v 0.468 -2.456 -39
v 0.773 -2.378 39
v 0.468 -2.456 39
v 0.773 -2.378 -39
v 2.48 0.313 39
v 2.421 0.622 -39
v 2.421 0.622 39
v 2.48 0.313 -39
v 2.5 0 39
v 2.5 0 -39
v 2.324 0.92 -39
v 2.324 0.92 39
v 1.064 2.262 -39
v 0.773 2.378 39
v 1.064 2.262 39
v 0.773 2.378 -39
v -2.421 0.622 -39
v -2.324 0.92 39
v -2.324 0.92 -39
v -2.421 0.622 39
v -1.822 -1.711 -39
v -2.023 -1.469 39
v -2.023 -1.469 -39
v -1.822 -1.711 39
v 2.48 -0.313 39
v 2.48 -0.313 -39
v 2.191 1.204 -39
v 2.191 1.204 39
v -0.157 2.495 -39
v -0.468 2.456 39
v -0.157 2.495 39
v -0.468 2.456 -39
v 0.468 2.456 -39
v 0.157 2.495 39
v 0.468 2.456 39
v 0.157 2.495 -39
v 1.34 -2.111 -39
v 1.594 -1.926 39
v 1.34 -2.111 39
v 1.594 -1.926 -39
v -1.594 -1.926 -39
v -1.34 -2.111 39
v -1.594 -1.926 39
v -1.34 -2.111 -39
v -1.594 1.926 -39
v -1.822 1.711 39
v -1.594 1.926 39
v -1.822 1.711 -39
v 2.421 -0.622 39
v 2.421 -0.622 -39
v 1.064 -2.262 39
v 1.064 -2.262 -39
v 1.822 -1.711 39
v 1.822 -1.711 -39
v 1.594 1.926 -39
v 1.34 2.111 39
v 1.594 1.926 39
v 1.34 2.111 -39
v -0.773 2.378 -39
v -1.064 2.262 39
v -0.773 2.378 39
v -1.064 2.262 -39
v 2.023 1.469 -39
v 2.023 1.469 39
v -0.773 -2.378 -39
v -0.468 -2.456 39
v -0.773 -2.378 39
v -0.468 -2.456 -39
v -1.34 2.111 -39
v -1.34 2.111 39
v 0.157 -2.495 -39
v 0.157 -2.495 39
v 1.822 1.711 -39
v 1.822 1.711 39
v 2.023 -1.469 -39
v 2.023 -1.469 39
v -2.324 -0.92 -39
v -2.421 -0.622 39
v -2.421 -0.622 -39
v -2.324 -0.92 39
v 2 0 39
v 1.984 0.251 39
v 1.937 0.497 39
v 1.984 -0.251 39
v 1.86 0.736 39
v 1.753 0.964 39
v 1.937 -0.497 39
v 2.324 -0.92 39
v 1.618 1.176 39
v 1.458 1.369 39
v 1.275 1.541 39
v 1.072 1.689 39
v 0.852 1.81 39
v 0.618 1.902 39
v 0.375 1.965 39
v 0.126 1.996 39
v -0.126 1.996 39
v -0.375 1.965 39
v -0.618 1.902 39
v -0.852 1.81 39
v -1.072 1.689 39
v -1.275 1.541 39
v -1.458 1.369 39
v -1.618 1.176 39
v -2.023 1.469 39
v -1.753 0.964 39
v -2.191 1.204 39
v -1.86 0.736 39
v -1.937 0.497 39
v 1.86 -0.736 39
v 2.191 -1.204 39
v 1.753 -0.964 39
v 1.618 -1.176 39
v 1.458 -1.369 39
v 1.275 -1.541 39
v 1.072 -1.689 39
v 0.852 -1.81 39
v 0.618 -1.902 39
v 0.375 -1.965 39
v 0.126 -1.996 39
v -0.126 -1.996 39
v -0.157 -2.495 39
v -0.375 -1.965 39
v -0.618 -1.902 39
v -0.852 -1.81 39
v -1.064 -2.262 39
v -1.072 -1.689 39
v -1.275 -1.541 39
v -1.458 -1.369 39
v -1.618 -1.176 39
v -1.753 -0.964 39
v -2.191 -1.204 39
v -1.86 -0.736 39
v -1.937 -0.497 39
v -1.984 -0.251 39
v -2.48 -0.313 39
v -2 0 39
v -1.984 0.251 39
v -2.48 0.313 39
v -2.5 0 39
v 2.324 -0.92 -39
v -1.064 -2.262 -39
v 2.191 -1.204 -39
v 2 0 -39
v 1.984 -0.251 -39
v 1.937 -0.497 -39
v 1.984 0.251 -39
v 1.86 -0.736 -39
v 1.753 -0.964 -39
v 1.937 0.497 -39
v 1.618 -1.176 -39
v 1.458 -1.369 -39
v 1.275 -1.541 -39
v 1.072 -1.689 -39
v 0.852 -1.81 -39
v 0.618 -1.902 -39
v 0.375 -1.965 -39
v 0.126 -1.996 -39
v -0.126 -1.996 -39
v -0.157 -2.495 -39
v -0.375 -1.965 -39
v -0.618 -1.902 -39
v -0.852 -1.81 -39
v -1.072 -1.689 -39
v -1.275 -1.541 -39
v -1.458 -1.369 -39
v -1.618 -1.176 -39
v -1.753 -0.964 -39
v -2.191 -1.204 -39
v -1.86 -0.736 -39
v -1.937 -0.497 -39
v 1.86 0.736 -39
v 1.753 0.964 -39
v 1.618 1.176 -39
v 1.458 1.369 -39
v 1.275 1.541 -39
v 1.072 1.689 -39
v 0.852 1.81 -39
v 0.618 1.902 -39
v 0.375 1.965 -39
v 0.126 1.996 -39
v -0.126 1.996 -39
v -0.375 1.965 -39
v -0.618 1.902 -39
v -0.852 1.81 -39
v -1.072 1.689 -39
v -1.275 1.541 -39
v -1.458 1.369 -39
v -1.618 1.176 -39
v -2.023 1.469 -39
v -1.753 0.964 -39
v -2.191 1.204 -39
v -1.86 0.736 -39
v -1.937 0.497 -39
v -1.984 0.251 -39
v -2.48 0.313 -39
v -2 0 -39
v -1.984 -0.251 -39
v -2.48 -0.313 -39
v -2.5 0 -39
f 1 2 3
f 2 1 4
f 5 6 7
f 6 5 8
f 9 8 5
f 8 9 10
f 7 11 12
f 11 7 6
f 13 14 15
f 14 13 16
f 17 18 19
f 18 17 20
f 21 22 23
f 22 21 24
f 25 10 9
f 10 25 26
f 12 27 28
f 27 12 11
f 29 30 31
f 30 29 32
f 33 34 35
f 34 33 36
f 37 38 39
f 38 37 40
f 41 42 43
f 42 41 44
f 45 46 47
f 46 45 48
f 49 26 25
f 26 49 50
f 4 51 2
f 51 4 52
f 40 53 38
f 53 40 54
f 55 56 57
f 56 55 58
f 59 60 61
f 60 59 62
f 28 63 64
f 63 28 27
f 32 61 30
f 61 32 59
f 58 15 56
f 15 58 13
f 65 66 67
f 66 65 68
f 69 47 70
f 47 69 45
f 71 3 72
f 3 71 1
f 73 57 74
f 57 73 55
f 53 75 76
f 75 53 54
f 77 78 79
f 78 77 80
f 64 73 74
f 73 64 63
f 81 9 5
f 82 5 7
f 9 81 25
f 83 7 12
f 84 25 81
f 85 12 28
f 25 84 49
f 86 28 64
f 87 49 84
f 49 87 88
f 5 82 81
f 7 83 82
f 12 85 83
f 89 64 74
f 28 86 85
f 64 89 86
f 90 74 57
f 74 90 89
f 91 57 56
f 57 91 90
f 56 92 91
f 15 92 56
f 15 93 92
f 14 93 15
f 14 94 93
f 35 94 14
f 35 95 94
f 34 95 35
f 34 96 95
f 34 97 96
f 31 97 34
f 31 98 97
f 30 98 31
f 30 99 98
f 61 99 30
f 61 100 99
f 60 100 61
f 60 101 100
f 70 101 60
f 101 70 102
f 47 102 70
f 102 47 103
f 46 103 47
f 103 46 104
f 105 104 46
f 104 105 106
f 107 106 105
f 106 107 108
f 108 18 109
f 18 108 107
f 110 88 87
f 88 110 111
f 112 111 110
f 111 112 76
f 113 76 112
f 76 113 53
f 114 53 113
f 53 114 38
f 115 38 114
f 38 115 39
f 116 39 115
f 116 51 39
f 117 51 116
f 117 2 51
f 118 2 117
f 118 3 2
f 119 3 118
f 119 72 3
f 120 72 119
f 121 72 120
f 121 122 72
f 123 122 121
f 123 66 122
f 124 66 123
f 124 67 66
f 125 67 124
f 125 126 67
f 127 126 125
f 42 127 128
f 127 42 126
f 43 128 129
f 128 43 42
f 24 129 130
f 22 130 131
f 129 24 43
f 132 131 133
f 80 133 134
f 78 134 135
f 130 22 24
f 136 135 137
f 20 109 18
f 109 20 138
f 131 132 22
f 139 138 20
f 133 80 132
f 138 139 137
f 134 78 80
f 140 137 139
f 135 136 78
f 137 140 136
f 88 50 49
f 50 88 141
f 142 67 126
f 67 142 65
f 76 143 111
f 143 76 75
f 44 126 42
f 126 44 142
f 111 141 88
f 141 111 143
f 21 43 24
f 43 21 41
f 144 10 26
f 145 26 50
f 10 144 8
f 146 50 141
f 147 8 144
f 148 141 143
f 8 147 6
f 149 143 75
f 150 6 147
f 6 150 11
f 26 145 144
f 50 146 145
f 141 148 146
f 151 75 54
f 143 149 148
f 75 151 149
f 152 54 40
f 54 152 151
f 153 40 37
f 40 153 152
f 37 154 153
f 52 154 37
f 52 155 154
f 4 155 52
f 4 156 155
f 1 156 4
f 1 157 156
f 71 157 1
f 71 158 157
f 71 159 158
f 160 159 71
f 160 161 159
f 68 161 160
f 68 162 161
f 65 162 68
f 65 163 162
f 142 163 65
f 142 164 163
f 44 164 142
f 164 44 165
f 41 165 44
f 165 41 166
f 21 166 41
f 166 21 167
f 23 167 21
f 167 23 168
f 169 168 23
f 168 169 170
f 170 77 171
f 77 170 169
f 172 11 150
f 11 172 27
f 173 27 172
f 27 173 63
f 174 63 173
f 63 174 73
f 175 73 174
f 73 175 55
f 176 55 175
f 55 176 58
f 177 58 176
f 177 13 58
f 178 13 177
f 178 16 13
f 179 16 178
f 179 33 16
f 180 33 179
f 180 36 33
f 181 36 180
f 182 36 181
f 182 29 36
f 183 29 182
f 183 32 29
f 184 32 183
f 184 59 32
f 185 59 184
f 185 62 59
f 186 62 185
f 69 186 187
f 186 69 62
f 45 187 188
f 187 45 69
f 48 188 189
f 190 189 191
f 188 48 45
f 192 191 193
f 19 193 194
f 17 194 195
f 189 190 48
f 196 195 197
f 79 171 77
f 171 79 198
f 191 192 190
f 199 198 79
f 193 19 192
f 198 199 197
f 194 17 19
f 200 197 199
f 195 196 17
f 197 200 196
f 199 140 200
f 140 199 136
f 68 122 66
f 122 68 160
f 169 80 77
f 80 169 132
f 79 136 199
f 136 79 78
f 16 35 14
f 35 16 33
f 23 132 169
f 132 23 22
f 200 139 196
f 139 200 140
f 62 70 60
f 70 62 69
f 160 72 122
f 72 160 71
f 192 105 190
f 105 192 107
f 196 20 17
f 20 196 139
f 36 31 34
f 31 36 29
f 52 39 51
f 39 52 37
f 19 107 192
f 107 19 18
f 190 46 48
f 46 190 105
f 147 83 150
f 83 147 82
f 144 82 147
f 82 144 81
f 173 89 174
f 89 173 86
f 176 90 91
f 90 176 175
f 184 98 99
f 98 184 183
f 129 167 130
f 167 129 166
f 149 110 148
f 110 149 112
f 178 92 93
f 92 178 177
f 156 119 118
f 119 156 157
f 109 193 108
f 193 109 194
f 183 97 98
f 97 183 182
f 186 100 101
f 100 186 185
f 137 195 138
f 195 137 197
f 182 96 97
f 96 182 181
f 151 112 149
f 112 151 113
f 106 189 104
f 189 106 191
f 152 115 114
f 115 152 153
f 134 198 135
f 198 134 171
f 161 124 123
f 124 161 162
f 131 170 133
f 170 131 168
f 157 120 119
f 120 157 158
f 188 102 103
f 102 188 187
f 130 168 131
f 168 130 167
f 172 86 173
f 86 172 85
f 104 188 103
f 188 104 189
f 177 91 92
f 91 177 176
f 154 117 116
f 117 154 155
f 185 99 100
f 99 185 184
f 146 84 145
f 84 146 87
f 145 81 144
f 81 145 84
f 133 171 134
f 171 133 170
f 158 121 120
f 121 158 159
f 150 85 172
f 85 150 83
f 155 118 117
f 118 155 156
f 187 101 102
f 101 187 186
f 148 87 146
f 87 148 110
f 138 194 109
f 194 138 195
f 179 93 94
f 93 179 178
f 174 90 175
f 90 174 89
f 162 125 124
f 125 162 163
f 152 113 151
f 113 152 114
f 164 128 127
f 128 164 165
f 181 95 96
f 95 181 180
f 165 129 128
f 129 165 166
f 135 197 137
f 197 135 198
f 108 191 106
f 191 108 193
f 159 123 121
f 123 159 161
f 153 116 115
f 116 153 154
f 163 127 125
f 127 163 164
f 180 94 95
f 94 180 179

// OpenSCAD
$fn = 50;


difference() {
	union() {
		translate(v = [0, 0, -39.0000000000]) {
			cylinder(h = 78, r = 2.5000000000);
		}
	}
	union() {
		translate(v = [0, 0, -100.0000000000]) {
			cylinder(h = 200, r = 2.0000000000);
		}
	}
}
